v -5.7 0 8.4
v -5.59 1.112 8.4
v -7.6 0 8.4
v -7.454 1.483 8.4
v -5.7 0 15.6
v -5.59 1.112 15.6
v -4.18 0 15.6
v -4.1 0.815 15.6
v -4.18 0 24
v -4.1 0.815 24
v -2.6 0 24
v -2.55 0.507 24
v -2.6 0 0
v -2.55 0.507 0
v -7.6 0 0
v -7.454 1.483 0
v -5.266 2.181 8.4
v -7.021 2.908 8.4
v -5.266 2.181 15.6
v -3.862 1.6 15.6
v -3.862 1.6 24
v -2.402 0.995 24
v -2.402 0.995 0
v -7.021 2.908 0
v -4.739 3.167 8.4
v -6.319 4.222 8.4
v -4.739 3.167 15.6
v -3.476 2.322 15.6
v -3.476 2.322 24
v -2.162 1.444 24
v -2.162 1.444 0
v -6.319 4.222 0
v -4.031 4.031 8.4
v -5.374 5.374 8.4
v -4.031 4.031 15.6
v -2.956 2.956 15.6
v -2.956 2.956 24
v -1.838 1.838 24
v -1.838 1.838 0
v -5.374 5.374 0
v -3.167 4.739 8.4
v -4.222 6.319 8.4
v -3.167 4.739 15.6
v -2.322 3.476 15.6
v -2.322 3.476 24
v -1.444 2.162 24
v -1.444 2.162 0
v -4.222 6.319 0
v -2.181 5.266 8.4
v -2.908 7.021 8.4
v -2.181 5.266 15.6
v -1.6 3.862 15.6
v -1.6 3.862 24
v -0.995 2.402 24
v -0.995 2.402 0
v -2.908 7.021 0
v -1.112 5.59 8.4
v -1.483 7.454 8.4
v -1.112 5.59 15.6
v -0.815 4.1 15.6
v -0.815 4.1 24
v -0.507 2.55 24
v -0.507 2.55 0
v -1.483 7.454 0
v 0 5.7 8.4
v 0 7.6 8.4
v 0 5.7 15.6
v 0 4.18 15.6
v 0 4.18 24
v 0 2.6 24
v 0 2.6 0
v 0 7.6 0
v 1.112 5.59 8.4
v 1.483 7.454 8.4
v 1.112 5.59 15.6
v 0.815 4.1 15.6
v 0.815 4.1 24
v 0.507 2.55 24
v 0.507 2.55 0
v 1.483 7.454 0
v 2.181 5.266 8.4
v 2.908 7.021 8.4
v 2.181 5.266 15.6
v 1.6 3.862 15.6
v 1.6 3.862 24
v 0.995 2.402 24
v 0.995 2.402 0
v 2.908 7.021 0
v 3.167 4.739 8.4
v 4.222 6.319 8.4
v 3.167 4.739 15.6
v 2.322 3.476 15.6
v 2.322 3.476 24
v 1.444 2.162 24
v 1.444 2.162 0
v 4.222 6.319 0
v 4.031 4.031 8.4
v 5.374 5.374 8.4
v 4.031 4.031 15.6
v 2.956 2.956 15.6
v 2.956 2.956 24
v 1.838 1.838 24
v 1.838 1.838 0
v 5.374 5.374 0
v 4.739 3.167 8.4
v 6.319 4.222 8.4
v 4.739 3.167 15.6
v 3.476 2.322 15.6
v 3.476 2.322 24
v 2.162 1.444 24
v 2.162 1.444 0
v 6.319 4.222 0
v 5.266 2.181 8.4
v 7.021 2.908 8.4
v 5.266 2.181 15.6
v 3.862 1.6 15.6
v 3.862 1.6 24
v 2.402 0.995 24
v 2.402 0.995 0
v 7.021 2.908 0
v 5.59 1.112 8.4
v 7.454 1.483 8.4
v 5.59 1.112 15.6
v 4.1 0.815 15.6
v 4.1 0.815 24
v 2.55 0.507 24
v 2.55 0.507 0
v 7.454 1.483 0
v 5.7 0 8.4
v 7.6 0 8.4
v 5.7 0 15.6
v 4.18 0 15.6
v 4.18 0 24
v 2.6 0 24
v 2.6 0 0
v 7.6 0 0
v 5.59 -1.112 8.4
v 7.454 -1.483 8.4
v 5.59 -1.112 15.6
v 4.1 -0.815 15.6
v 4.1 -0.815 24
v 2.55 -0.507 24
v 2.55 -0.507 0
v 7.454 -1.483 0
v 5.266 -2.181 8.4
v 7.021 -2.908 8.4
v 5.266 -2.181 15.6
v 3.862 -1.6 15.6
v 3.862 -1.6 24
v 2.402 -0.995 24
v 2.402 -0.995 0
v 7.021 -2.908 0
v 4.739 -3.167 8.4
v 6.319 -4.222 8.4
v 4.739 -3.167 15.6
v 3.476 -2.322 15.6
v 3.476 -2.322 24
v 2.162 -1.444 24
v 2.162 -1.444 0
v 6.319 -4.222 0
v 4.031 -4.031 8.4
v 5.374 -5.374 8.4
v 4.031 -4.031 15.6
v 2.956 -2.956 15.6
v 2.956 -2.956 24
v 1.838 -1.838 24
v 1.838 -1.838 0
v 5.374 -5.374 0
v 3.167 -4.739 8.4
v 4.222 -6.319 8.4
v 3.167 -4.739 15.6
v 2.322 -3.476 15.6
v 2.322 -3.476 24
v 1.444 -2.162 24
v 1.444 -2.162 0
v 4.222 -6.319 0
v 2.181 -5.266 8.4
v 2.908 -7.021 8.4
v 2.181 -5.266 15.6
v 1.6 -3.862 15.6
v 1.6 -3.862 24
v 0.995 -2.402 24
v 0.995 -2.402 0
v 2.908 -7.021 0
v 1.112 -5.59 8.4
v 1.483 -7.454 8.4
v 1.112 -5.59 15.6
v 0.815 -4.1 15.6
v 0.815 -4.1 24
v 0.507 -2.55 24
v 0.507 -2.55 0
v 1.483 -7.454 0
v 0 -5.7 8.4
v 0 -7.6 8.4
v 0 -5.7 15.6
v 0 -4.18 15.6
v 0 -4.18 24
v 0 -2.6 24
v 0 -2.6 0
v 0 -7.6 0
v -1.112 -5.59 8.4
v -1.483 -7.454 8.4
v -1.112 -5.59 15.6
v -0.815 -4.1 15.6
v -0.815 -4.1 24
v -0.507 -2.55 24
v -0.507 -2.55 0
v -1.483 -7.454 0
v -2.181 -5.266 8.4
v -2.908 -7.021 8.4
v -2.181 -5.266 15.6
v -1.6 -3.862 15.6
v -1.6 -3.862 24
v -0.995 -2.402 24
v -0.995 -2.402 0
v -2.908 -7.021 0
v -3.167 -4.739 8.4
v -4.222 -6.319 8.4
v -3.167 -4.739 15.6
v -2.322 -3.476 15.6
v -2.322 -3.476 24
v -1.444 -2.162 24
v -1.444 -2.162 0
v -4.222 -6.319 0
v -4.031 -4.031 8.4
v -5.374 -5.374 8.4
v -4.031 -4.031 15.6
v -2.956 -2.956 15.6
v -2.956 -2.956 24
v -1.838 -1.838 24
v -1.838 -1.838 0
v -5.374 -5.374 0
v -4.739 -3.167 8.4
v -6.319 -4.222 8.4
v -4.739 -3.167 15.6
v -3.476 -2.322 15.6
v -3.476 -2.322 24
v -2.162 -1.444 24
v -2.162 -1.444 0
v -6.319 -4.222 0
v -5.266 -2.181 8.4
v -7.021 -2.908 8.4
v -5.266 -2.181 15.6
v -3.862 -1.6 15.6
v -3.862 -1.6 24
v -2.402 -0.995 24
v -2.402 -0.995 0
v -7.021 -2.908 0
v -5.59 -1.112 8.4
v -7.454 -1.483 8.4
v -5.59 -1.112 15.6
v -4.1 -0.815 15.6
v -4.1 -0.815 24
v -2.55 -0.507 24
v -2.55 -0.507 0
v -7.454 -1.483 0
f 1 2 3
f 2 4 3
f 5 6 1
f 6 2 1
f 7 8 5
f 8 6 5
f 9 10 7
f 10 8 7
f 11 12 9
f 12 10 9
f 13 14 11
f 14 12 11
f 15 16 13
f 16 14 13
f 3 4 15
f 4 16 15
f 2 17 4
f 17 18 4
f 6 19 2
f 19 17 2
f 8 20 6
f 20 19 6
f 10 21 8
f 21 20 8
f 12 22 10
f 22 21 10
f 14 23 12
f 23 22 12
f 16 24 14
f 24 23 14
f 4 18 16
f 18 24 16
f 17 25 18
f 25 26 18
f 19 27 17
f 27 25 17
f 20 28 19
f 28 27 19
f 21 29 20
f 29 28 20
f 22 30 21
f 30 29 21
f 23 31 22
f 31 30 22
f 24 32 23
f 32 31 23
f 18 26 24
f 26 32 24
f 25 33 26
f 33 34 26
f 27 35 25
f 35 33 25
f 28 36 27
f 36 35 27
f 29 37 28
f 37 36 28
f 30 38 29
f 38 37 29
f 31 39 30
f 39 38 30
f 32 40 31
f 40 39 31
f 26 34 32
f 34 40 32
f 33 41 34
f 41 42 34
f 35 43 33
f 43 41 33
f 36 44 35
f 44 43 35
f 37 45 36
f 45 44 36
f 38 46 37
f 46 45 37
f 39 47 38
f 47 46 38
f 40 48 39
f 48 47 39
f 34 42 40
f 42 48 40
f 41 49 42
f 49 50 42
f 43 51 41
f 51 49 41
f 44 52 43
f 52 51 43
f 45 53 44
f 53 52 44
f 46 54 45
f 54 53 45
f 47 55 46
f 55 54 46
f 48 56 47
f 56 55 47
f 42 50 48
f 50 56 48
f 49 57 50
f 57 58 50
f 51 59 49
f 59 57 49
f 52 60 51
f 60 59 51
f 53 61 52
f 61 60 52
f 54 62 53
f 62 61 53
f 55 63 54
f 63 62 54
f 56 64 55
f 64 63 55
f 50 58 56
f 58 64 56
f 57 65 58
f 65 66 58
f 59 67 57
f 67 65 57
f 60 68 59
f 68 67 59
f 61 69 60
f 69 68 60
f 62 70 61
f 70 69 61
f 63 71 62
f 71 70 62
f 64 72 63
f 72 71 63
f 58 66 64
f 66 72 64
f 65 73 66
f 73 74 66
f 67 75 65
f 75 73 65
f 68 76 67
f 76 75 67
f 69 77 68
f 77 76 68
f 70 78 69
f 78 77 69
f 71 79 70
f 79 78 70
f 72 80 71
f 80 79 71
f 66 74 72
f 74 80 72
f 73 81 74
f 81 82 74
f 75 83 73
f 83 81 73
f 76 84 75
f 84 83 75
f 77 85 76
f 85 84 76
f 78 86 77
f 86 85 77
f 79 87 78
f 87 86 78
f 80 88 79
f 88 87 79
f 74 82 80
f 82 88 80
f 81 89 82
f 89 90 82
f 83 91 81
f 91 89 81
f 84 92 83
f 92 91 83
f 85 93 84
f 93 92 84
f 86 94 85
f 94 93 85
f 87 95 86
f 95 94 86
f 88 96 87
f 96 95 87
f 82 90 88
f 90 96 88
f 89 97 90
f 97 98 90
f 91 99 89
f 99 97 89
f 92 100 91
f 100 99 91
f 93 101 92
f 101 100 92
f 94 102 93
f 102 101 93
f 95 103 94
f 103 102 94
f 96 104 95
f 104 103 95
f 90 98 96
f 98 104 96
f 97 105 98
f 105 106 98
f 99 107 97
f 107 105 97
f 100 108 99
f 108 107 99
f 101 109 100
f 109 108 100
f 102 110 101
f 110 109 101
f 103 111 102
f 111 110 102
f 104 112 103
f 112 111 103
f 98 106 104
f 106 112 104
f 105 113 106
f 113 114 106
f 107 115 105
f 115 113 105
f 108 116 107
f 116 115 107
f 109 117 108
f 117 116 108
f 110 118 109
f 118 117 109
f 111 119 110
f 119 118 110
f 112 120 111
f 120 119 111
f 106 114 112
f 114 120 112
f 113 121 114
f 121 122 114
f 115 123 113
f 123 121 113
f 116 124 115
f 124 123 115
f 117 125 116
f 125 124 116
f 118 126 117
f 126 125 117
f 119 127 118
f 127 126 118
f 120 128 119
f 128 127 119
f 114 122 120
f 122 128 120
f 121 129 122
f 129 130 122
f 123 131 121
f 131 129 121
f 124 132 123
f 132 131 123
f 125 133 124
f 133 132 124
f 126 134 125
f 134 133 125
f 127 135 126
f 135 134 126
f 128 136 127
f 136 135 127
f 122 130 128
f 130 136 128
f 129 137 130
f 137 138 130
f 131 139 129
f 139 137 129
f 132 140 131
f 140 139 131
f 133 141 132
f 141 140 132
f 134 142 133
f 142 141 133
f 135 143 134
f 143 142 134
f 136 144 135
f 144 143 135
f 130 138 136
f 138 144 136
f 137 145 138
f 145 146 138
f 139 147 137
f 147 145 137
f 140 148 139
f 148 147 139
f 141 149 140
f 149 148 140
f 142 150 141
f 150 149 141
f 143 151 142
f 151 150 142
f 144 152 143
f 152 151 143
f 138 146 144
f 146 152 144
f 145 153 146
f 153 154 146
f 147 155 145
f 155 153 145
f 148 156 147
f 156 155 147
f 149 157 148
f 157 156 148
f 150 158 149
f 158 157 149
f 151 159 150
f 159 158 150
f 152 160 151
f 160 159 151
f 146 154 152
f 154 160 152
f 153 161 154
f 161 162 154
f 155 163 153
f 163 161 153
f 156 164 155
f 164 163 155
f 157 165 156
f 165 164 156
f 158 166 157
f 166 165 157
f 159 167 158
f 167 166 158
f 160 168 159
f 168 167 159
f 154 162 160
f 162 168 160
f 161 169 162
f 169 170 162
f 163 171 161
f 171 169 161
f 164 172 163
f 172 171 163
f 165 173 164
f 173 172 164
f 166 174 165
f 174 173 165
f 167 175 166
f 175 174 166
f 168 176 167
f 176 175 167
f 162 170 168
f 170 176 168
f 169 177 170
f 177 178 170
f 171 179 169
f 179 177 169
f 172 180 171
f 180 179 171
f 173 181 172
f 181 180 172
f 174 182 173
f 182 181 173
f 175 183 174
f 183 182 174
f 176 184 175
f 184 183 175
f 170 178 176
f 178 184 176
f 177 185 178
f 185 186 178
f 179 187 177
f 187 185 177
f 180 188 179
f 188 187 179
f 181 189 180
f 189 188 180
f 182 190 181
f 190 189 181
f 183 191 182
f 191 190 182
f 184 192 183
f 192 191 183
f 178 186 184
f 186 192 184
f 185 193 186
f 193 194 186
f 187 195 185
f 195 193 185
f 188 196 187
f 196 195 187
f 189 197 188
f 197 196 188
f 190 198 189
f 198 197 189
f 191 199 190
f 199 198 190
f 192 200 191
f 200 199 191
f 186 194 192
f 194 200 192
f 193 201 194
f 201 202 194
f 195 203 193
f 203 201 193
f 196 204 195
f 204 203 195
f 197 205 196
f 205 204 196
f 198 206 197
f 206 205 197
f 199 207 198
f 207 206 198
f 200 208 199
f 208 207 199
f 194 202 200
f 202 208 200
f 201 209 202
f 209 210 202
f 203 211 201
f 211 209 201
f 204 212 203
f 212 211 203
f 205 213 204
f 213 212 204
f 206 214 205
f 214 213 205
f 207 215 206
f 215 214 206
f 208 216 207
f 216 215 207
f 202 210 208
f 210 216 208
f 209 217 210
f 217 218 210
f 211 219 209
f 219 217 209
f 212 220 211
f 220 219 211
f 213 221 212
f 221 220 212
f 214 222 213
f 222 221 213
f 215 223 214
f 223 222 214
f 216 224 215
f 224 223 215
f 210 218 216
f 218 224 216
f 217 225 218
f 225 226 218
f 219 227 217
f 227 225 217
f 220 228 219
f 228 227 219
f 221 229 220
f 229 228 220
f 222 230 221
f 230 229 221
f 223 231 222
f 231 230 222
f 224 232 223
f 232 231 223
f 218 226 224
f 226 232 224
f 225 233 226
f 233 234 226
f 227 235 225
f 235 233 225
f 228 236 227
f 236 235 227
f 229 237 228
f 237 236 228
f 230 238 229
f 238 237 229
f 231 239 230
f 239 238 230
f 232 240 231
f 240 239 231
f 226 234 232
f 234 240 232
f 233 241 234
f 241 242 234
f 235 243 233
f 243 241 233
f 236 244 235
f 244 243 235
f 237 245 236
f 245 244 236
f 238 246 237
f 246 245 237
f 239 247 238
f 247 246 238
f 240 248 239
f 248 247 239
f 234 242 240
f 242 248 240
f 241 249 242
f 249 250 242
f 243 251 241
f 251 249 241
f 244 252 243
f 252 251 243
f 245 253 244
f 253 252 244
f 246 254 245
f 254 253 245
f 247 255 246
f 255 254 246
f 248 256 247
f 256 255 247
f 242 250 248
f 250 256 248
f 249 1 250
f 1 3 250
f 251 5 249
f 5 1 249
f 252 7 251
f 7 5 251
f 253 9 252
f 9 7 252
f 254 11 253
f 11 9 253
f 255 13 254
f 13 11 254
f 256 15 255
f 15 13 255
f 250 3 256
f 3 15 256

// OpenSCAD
$fn = 32;

// ----------------------------------------------------------------------
// Profiled standoff: stepped spacer, 24 mm long, bore 5.2 mm
// ----------------------------------------------------------------------

// --- parameters (mm) ---
revolve_angle = 360;      // full turn around the Z axis
profile_points = 8;       // points of the closed outline

profile = [[2.6, 0], [7.6, 0], [7.6, 8.4], [5.7, 8.4], [5.7, 15.6], [4.18, 15.6], [4.18, 24], [2.6, 24]];  // single closed polygon, 8 points, counter clockwise

// --- the one profile operation ---
rotate_extrude(angle = revolve_angle) polygon(points = profile);
